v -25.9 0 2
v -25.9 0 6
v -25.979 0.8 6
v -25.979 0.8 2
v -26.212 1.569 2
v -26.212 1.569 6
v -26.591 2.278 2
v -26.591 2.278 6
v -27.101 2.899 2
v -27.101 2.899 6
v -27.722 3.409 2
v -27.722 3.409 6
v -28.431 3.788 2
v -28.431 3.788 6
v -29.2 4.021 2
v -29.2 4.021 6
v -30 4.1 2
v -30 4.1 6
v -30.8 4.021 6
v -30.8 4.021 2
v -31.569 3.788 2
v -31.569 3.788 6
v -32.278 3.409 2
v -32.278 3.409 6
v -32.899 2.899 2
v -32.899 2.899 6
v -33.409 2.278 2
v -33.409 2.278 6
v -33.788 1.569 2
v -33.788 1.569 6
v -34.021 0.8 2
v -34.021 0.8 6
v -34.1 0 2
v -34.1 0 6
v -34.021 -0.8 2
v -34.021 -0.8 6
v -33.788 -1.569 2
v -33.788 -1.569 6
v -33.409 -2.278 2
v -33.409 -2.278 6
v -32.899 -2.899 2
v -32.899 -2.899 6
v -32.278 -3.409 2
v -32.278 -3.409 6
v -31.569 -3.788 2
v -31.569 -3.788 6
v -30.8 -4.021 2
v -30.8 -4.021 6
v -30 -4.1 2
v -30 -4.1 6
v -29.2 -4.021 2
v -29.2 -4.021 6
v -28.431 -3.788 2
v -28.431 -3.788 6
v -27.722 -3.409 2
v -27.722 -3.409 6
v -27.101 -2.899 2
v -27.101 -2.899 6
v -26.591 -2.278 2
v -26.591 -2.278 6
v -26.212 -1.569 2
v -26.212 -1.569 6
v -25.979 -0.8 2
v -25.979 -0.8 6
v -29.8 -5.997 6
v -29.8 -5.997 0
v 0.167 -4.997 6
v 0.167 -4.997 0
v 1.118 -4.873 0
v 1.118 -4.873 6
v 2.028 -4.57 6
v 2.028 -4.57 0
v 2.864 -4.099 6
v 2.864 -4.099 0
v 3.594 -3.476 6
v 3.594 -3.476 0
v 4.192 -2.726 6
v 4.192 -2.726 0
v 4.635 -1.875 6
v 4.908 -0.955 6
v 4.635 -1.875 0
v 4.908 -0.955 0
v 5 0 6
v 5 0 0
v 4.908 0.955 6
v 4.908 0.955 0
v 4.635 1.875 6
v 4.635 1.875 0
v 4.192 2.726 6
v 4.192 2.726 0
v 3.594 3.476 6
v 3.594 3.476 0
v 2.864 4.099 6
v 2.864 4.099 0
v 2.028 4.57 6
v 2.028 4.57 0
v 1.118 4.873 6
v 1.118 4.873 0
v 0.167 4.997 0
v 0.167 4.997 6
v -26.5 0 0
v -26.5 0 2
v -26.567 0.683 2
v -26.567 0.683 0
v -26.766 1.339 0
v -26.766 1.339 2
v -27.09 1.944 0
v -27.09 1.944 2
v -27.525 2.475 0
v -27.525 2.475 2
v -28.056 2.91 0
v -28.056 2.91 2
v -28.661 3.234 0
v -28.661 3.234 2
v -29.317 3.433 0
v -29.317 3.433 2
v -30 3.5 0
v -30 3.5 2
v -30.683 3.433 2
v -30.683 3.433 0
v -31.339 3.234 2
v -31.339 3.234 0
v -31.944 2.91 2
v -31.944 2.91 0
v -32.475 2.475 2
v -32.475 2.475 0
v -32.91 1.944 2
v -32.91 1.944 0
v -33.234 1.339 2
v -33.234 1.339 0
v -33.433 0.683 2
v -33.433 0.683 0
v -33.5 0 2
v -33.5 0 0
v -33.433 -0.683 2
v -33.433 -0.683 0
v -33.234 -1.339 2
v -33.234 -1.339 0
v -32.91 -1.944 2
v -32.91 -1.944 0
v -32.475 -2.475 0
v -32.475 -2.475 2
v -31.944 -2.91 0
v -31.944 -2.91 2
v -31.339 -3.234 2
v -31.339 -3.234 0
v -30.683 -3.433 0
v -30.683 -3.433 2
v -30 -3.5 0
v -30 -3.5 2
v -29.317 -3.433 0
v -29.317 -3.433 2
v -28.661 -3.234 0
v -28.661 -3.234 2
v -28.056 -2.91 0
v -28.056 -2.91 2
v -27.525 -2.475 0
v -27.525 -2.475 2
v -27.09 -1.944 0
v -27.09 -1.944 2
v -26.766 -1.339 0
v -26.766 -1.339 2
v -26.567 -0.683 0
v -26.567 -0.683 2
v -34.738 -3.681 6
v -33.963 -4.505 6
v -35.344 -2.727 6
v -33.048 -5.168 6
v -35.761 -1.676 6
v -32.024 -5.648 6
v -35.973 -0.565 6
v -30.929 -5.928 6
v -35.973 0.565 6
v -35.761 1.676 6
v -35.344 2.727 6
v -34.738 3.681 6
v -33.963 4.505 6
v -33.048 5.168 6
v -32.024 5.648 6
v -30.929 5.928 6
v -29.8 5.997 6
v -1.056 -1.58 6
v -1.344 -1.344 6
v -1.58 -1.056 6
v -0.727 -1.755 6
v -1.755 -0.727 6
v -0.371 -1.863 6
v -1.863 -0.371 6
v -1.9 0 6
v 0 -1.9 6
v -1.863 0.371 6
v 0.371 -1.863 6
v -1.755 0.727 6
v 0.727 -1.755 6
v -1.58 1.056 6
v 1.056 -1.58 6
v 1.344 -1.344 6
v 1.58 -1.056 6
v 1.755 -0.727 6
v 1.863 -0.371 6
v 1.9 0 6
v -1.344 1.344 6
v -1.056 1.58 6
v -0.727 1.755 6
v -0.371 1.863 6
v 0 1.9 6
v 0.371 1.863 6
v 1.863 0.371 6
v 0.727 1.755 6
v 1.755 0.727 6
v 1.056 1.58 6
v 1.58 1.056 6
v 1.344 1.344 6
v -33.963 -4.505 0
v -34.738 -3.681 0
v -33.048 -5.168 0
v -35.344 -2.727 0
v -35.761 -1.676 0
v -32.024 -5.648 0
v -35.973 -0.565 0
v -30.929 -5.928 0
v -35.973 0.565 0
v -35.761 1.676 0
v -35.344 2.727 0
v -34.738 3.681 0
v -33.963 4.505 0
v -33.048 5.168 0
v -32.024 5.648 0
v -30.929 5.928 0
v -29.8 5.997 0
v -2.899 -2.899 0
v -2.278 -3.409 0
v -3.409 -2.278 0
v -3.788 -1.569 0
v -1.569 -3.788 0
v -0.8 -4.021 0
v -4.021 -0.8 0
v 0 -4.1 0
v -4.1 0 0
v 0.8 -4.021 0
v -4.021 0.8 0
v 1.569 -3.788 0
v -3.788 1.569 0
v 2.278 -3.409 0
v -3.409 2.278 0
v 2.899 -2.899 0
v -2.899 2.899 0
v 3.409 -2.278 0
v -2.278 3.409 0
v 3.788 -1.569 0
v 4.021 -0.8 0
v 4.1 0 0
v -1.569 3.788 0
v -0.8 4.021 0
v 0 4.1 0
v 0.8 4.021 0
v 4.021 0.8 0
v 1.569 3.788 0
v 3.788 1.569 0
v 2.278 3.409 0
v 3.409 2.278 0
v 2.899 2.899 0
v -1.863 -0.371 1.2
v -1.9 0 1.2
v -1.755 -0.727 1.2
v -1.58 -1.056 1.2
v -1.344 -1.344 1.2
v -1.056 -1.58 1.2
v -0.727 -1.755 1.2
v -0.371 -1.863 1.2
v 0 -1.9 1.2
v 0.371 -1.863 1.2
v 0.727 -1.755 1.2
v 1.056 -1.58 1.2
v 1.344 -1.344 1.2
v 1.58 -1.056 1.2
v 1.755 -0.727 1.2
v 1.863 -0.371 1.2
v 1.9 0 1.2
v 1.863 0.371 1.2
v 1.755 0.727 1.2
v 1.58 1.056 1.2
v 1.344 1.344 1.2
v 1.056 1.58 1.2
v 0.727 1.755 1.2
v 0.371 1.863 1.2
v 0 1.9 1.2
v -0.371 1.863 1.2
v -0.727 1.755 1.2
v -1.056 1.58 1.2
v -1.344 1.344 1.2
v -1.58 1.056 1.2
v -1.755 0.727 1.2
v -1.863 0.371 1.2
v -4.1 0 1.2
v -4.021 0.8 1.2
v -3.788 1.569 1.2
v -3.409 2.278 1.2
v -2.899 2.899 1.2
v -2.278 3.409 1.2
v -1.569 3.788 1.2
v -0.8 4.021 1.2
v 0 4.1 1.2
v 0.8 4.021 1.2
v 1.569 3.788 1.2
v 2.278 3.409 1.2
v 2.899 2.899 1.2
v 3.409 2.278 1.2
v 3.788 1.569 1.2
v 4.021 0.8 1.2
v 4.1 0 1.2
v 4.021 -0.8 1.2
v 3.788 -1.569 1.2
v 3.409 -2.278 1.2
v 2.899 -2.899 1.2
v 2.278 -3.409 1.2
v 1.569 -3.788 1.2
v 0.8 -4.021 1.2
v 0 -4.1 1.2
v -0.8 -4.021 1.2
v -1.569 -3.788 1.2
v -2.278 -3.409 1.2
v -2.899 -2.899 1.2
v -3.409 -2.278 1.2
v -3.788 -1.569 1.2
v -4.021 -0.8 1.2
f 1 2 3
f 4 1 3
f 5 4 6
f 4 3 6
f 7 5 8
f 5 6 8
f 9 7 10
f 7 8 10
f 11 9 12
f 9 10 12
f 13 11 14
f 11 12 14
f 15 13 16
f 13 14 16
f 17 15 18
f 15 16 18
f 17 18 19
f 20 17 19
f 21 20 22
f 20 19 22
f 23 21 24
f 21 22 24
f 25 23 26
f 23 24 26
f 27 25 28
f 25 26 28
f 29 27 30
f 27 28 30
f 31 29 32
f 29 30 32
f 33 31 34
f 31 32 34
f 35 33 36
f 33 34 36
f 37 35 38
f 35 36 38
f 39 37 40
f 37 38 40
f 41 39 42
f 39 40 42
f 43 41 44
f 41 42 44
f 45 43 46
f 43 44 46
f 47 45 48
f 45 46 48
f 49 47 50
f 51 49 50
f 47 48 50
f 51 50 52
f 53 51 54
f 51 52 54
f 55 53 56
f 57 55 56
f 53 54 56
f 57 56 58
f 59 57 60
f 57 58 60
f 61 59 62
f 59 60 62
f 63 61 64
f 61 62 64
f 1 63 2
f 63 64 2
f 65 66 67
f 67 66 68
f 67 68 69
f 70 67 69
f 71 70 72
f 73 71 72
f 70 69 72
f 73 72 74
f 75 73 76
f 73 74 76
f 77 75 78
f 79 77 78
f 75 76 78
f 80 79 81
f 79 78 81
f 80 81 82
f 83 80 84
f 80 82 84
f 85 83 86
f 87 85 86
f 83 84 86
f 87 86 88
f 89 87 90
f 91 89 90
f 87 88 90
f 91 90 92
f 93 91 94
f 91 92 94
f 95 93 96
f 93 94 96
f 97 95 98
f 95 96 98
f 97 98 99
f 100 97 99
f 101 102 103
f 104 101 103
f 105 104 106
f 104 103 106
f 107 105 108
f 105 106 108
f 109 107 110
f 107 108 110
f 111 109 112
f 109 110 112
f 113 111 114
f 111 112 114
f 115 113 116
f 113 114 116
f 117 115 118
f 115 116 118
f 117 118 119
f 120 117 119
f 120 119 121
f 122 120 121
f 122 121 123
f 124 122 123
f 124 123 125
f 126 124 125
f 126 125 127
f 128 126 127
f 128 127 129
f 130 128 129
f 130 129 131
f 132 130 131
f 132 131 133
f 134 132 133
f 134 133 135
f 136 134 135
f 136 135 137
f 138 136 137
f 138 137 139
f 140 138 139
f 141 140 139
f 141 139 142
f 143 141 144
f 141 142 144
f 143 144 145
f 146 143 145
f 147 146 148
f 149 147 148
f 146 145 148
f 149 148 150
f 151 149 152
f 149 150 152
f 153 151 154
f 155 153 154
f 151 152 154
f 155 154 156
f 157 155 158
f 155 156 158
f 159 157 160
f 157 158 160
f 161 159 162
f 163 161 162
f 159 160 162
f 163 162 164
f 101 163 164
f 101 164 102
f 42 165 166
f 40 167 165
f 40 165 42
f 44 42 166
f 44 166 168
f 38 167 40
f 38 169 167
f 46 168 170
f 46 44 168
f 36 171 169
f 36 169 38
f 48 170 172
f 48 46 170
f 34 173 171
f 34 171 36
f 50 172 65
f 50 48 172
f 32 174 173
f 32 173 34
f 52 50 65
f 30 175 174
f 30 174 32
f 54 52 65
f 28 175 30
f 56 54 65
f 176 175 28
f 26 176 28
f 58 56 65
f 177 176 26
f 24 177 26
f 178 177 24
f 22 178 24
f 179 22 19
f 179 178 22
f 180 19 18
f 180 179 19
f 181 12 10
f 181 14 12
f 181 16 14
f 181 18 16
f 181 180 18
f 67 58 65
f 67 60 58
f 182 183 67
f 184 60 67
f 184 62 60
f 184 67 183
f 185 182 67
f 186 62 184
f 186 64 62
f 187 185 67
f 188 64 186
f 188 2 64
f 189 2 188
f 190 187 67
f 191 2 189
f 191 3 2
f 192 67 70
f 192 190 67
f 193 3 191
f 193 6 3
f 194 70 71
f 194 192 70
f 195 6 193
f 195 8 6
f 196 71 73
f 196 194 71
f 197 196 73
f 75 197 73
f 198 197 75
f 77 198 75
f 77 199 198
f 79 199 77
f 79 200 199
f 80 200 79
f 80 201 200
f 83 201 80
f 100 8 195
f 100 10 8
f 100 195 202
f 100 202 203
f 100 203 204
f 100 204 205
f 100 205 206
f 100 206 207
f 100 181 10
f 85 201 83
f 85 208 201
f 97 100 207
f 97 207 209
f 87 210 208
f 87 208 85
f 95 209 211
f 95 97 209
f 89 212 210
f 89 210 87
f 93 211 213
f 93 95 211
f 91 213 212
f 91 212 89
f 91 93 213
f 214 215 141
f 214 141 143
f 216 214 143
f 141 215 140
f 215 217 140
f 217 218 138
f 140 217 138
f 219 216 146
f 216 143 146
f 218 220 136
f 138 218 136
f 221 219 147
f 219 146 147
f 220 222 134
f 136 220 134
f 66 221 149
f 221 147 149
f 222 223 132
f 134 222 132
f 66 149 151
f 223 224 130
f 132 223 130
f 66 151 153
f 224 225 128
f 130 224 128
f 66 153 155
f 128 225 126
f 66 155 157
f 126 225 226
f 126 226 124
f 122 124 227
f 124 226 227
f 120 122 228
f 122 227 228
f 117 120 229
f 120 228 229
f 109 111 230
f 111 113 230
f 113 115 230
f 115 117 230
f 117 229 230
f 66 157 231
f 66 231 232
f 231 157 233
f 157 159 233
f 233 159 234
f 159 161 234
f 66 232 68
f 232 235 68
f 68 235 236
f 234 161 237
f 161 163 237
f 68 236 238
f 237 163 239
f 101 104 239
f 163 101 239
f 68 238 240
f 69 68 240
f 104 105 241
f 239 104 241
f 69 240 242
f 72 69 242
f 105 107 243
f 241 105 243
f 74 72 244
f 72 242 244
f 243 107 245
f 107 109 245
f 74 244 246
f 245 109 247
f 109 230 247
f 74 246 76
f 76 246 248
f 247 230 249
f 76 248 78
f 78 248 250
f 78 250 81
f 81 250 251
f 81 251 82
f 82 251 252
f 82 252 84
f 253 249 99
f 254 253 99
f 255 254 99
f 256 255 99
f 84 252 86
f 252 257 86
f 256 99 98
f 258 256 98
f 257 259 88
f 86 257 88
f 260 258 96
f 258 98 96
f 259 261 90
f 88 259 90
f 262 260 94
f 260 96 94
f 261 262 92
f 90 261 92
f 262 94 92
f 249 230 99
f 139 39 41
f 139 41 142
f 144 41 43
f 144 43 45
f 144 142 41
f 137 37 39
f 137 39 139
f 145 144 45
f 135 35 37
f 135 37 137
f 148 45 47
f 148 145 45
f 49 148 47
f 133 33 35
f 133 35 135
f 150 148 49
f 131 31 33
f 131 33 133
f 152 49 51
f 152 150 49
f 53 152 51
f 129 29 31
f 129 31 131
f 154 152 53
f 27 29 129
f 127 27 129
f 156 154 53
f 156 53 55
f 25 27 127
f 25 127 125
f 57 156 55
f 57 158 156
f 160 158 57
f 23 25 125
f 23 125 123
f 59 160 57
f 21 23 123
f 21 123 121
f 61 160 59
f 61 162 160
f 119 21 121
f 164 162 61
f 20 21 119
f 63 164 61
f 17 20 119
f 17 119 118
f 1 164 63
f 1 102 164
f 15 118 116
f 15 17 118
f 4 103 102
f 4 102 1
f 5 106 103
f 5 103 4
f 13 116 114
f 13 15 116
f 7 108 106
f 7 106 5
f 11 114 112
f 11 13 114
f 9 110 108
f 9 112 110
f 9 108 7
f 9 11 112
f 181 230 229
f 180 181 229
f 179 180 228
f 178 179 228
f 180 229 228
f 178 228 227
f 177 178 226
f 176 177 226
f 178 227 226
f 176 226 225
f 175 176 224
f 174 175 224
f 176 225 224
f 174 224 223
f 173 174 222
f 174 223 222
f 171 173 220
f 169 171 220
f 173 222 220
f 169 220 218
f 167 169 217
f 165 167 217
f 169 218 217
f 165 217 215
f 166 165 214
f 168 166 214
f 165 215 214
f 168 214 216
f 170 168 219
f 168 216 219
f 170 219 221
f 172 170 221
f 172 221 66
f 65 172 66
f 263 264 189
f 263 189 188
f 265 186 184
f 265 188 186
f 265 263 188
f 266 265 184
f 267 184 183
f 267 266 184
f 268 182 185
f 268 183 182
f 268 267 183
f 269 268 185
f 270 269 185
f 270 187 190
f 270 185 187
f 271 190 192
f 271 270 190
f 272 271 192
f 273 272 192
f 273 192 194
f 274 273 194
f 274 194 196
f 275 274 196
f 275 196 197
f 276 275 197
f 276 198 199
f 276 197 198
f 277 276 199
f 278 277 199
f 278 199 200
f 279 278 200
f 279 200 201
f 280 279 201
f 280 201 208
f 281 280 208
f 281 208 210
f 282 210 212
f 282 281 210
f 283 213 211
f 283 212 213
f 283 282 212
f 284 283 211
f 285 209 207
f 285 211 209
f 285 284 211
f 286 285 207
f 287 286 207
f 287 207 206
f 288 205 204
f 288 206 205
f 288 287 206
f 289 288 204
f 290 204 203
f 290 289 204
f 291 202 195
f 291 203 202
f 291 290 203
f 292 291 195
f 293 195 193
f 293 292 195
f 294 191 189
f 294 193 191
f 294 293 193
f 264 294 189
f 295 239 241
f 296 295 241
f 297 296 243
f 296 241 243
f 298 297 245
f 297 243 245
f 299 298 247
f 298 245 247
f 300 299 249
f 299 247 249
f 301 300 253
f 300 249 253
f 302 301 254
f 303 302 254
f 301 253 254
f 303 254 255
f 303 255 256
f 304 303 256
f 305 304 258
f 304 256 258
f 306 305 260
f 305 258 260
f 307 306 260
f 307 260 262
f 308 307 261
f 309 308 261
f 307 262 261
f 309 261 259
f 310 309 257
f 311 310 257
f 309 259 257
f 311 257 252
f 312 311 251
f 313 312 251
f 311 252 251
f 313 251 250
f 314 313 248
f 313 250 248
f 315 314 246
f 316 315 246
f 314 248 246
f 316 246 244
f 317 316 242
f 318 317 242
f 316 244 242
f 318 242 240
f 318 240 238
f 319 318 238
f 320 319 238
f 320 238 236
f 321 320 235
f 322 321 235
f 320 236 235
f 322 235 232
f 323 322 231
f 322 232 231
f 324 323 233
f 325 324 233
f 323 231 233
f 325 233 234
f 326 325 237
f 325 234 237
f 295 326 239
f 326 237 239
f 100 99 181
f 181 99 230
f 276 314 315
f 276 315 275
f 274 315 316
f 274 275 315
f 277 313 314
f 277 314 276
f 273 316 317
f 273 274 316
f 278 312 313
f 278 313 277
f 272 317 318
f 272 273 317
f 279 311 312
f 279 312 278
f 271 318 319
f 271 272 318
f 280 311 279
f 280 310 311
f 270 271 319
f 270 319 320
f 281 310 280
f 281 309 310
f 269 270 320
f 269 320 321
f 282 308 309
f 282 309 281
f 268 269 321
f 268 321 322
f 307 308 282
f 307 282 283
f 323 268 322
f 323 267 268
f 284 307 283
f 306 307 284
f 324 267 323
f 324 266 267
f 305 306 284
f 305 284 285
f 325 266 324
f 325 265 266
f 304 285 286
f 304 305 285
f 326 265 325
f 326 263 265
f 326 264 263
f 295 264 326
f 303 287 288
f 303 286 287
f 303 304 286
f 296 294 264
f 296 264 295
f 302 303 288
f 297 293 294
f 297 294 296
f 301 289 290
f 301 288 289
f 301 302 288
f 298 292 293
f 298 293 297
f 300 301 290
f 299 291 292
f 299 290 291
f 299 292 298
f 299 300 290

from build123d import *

# Parameters (mm, degrees)
EXTRUDE_1_DEPTH          = 6
SKETCH_3_R               = 4.1
CUT_EXTRUDE_2_DEPTH      = 1.2
SKETCH_4_R               = 4.1
CUT_EXTRUDE_3_DEPTH      = 4
SKETCH_5_R               = 3.5
CUT_EXTRUDE_5_DEPTH      = 37.986484018
CUT_EXTRUDE_6_DEPTH      = 37.986484018
CUT_EXTRUDE_6_DEPTH_BACK = 37.986484018
SKETCH_6_R               = 1.9


with BuildPart() as part:
    # ｽｹｯﾁ1 → ﾎﾞｽ - 押し出し1 (new body)
    with BuildSketch(Plane.XY):
        with BuildLine():
            Line((0.166666667, 4.99722145), (-29.8, 5.99666574))
            ThreePointArc((-29.8, 5.99666574), (-36, 0), (-29.8, -5.99666574))
            Line((-29.8, -5.99666574), (0.166666667, -4.99722145))
            ThreePointArc((0.166666667, -4.99722145), (5, 0), (0.166666667, 4.99722145))
        make_face()
    extrude(amount=EXTRUDE_1_DEPTH)

    # ｽｹｯﾁ3 → ｶｯﾄ - 押し出し2 (cut)
    with BuildSketch(Plane(origin=(0, 0, 0), x_dir=(-1, 0, 0), z_dir=(0, 0, -1))):
        Circle(SKETCH_3_R)
    extrude(amount=-CUT_EXTRUDE_2_DEPTH, mode=Mode.SUBTRACT)

    # ｽｹｯﾁ4 → ｶｯﾄ - 押し出し3 (cut)
    with BuildSketch(Plane.XY.offset(6)):
        with Locations((-30, 0)):
            Circle(SKETCH_4_R)
    extrude(amount=-CUT_EXTRUDE_3_DEPTH, mode=Mode.SUBTRACT)

    # ｽｹｯﾁ5 → ｶｯﾄ - 押し出し5 (cut, through all)
    with BuildSketch(Plane.XY.offset(6)):
        with Locations((-30, 0)):
            Circle(SKETCH_5_R)
    extrude(amount=-CUT_EXTRUDE_5_DEPTH, mode=Mode.SUBTRACT)

    # ｽｹｯﾁ6 → ｶｯﾄ - 押し出し6 (cut, two sides: drawn at the far end of the back side and taken through both)
    with BuildSketch(Plane.XY.offset(6).offset(-CUT_EXTRUDE_6_DEPTH_BACK)):
        with Locations(Location((0, 0, 0), (0, 0, 180))):
            Circle(SKETCH_6_R)
    extrude(amount=CUT_EXTRUDE_6_DEPTH + CUT_EXTRUDE_6_DEPTH_BACK, mode=Mode.SUBTRACT)


solid = part.part
